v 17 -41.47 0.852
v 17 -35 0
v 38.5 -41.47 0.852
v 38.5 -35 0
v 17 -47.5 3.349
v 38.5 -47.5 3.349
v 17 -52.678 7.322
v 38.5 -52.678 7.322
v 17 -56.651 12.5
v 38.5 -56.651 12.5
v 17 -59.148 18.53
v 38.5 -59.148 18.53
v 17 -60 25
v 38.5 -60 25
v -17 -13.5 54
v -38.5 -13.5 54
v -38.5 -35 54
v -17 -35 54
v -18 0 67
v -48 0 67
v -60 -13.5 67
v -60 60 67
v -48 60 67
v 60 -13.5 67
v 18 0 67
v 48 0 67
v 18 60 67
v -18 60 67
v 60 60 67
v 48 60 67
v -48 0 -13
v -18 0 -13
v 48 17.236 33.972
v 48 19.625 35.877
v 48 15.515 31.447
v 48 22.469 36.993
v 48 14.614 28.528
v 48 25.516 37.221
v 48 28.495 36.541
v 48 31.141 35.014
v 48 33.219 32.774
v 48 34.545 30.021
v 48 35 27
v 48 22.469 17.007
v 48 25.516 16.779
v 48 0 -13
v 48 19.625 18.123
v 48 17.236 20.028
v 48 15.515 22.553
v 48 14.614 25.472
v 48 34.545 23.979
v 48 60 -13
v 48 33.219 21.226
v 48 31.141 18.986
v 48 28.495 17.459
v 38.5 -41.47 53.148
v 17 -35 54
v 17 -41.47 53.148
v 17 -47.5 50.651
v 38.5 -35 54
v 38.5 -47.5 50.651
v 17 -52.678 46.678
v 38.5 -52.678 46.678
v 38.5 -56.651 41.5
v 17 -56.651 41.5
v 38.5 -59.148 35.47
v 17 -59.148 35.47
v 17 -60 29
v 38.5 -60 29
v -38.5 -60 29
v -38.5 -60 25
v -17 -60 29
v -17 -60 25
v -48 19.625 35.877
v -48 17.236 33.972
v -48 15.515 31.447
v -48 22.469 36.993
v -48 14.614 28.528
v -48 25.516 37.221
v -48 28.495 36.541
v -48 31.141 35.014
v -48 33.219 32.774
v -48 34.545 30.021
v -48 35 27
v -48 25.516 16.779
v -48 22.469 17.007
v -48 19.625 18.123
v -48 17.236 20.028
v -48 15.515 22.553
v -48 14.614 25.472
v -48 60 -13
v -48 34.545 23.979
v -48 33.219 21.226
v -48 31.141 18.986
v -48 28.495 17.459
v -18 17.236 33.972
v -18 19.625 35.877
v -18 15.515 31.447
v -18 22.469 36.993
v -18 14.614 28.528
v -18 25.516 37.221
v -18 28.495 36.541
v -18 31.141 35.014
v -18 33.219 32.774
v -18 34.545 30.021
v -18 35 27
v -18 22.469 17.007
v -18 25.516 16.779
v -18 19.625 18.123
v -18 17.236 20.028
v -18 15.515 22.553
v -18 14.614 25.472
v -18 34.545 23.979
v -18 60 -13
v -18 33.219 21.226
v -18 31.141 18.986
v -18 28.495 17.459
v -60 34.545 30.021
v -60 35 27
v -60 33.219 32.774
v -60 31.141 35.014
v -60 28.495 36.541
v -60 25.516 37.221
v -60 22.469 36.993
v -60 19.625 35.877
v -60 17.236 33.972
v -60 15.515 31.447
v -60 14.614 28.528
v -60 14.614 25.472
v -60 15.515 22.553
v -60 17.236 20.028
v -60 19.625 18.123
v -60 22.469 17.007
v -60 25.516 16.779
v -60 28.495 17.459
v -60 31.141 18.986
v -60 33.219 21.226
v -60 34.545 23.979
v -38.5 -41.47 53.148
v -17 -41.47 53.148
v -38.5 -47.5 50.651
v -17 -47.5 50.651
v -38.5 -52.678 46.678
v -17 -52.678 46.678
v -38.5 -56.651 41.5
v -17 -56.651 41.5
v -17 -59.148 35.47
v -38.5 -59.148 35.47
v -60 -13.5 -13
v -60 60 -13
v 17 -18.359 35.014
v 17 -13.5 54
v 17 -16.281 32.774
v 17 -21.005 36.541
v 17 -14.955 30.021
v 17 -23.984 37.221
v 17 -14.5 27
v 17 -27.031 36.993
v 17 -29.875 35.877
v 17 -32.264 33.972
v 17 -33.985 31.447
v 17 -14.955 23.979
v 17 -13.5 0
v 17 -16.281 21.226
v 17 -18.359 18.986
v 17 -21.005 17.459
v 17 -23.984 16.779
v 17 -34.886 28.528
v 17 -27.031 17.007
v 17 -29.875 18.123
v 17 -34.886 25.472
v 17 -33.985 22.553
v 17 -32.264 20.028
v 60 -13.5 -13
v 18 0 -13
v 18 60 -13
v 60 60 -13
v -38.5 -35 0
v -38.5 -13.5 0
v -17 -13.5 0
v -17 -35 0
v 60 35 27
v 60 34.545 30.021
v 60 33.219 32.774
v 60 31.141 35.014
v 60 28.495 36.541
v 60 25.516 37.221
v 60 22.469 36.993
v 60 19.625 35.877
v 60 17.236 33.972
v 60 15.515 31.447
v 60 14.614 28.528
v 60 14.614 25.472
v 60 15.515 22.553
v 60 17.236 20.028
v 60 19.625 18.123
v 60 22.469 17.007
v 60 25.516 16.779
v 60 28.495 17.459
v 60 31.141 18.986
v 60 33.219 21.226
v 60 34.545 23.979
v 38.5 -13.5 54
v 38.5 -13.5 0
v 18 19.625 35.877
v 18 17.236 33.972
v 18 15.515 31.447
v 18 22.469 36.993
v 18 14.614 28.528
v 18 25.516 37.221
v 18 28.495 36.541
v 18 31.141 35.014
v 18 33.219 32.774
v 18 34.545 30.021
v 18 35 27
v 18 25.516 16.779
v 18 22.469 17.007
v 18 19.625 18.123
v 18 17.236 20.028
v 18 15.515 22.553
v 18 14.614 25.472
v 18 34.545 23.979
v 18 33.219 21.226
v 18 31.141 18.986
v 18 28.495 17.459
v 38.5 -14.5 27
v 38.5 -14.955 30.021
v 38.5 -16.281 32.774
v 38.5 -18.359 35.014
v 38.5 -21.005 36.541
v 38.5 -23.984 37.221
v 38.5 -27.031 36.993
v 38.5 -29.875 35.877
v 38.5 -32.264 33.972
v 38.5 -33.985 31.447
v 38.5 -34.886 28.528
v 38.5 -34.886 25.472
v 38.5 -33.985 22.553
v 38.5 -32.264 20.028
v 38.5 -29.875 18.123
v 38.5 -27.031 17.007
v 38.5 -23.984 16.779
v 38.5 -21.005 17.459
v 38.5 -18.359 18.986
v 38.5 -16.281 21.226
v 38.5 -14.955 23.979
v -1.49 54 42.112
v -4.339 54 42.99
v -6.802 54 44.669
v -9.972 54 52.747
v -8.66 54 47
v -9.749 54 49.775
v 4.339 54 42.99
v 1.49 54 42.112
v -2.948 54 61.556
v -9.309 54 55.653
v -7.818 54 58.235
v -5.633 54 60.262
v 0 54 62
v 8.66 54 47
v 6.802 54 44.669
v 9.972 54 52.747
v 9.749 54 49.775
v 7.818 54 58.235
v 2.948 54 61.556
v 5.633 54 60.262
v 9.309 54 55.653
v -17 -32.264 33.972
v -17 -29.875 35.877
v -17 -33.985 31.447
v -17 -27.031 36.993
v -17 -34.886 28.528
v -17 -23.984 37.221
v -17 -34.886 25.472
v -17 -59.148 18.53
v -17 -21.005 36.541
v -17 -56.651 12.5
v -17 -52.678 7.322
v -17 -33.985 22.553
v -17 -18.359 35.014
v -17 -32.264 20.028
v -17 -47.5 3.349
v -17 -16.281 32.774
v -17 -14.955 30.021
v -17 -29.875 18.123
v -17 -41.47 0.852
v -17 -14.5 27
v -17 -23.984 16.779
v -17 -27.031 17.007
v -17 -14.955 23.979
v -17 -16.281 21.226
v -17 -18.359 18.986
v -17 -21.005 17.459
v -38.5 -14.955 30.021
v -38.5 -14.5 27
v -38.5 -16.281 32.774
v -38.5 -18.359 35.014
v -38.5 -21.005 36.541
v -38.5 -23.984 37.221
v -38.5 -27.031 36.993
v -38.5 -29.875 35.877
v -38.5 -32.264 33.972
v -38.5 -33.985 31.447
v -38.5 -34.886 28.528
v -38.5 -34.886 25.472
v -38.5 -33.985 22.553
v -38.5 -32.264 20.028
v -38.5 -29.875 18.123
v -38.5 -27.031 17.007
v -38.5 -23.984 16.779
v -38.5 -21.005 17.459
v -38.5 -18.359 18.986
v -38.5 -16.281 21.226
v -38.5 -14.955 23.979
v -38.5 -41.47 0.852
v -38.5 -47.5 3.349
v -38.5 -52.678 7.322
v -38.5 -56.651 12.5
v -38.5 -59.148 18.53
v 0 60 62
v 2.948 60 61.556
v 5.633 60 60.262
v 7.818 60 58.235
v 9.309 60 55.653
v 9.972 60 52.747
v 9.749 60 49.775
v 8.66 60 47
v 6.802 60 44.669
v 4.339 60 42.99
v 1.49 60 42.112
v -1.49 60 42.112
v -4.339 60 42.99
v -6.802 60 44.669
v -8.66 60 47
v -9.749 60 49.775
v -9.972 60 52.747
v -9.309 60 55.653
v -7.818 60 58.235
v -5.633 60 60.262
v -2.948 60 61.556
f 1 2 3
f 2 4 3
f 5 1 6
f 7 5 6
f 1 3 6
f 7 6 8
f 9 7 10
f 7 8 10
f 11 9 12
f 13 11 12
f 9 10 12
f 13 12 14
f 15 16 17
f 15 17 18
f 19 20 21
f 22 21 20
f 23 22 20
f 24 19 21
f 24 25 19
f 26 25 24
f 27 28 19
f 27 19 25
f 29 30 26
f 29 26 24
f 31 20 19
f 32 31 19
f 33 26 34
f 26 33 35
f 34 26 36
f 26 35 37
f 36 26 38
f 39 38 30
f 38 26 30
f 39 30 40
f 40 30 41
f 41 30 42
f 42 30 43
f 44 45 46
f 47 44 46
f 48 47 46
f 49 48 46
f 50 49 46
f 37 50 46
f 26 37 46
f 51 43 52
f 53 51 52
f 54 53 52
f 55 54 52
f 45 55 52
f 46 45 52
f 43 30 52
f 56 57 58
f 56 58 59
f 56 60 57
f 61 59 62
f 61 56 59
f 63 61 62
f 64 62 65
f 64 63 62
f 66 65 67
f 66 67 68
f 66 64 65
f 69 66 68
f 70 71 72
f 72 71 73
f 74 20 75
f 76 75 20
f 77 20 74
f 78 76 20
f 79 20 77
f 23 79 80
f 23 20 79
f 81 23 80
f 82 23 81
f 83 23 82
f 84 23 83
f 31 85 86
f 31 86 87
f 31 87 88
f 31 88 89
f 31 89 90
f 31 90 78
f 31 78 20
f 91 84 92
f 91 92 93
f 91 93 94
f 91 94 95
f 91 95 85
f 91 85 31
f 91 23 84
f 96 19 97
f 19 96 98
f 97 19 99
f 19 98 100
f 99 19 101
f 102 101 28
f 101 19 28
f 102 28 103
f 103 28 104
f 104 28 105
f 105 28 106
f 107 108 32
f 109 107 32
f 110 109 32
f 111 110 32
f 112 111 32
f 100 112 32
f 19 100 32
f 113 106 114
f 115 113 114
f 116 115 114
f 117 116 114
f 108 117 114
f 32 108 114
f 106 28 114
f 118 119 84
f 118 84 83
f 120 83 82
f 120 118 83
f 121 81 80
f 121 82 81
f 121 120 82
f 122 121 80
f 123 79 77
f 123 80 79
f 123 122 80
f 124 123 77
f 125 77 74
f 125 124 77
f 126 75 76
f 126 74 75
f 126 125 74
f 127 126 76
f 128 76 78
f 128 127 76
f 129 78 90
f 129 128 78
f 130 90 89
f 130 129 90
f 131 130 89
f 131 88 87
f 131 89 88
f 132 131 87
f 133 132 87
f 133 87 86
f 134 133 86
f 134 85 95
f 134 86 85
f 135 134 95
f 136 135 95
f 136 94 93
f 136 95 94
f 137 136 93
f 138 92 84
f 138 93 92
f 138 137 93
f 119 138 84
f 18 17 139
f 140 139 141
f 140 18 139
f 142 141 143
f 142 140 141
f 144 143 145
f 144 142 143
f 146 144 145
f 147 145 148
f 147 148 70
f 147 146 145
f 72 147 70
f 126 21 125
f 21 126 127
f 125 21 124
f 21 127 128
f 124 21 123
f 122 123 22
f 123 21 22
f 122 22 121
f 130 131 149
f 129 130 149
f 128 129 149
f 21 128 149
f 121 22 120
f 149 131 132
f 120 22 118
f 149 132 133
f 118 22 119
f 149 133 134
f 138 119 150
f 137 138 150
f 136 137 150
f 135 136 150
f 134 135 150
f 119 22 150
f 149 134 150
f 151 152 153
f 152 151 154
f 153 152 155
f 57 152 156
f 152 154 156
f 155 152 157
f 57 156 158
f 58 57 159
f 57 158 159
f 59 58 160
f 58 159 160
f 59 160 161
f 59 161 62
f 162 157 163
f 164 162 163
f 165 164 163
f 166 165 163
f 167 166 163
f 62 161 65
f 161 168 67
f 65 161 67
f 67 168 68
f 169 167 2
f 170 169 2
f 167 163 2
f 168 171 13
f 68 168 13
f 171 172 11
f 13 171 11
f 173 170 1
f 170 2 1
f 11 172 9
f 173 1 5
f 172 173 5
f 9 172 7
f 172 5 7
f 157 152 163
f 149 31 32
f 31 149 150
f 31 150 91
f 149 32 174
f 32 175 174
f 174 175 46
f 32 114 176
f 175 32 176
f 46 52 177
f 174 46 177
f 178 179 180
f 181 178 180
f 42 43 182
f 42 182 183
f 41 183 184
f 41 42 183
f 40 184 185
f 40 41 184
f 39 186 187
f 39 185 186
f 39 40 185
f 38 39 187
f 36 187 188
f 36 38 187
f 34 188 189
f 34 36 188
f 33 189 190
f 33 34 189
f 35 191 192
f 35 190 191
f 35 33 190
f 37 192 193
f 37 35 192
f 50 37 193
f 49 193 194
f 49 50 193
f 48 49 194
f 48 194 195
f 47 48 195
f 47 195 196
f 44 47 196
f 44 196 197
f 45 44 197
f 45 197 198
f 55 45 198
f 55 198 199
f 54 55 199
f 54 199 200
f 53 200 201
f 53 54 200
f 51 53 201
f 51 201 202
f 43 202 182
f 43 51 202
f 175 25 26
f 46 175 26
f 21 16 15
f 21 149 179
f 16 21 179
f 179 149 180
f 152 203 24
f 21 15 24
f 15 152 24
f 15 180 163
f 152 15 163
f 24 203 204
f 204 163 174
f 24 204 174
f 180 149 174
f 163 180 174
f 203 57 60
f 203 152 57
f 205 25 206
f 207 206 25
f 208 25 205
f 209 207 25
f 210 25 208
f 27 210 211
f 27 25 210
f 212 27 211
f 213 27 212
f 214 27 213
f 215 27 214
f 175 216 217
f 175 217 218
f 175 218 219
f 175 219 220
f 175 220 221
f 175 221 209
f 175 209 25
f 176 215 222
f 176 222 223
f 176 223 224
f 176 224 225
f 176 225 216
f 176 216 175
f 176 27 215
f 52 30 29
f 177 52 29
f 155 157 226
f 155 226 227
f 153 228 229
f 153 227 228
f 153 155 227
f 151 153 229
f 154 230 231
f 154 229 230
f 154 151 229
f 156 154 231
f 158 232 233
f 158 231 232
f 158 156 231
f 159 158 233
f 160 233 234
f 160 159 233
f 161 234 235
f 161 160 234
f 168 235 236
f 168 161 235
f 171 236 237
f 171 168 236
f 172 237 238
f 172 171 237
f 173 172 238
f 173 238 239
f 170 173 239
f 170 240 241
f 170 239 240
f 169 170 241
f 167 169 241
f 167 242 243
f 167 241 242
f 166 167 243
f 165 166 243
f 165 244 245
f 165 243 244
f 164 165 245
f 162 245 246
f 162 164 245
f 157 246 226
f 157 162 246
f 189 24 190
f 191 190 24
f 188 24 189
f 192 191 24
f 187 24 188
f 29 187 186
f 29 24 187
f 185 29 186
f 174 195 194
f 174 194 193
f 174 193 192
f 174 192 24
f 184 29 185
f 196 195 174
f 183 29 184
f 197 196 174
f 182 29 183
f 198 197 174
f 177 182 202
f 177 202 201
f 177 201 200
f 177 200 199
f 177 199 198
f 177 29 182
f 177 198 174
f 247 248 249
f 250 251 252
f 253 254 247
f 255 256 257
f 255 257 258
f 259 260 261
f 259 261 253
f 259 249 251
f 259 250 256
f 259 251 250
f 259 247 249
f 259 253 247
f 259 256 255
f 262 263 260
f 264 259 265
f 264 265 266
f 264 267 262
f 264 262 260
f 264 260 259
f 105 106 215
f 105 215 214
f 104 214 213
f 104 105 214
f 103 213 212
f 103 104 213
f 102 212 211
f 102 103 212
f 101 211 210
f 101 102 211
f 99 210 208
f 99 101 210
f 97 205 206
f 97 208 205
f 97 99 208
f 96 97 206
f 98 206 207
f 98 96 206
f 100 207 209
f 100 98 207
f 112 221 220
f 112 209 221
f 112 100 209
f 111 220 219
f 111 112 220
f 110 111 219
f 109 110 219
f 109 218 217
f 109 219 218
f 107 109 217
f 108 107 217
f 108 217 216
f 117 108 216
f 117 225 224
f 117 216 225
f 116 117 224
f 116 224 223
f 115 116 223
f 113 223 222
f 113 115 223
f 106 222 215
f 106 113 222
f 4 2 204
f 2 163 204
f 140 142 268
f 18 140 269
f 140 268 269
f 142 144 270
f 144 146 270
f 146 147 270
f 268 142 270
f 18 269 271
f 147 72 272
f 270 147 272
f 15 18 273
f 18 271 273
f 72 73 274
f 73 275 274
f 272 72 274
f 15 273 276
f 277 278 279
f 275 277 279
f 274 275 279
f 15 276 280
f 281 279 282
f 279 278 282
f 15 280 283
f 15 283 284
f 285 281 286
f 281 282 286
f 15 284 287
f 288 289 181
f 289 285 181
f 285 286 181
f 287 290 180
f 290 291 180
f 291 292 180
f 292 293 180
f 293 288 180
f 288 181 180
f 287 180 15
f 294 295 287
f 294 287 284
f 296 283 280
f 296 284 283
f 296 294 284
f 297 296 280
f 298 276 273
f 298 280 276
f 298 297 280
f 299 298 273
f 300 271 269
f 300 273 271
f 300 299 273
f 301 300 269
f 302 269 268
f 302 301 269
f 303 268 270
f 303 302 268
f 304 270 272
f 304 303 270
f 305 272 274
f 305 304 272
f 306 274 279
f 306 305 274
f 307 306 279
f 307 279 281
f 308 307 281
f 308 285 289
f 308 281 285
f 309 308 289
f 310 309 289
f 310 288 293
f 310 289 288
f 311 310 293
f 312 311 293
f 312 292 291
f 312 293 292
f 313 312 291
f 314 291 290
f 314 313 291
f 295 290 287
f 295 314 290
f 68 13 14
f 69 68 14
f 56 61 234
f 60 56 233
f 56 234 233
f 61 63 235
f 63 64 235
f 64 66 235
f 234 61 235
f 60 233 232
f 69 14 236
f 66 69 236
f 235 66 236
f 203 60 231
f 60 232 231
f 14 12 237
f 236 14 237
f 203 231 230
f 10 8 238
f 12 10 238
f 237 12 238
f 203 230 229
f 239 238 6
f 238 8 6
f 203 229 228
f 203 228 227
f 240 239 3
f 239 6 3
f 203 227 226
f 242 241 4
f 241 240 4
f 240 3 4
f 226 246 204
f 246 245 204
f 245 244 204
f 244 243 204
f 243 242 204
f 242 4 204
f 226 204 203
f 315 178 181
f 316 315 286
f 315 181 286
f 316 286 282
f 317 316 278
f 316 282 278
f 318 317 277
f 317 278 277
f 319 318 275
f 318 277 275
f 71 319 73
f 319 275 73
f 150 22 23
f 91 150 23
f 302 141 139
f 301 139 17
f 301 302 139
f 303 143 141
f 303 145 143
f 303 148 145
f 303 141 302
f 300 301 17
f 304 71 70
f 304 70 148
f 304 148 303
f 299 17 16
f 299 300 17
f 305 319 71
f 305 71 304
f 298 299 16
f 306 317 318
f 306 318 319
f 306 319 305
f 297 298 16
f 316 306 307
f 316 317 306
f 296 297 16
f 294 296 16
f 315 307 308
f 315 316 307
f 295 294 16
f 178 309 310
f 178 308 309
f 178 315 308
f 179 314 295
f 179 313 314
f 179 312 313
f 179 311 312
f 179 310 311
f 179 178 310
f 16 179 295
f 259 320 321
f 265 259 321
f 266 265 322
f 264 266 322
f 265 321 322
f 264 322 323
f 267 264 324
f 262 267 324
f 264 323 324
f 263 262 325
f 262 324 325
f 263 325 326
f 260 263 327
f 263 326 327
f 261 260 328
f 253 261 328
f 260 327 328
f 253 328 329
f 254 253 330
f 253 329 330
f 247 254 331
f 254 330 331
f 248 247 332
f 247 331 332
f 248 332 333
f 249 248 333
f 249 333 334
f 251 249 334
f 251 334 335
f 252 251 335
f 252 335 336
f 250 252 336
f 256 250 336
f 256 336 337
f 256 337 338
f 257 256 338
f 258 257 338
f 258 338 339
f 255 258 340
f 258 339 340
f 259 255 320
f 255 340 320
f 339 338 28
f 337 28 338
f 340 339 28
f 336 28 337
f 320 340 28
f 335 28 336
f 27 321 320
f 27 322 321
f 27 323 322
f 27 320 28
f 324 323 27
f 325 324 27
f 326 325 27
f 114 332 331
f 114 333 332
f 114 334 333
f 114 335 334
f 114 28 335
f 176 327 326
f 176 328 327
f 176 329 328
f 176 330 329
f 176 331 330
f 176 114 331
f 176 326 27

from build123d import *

# Parameters (mm, degrees)
BOSS_EXTRUDE1_DEPTH     = 54
CUT_EXTRUDE1_DEPTH      = 145.623649518
CUT_EXTRUDE1_DEPTH_BACK = 145.623649518
SKETCH2_R               = 10.25
CUT_EXTRUDE2_DEPTH      = 145.623649518
CUT_EXTRUDE2_DEPTH_BACK = 145.623649518
SKETCH3_R               = 10.25
CUT_EXTRUDE3_DEPTH      = 101.578327685
CUT_EXTRUDE3_DEPTH_BACK = 101.578327685
SKETCH4_W               = 21.5
SKETCH4_H               = 46.5
FILLET1_R               = 25
SKETCH5_W               = 120
SKETCH5_H               = 13
BOSS_EXTRUDE2_DEPTH     = 73.5
SKETCH6_W               = 30
SKETCH6_H               = 80
CUT_EXTRUDE4_DEPTH      = 60
SKETCH7_R               = 10
CUT_EXTRUDE5_DEPTH      = 6


with BuildPart() as part:
    # Sketch1 → Boss-Extrude1 (new body)
    with BuildSketch(Plane.XY):
        Polygon((60, 60), (-60, 60), (-60, -60), (-17, -60), (-17, -13.5), (17, -13.5), (17, -60), (60, -60), align=None)
    extrude(amount=BOSS_EXTRUDE1_DEPTH)

    # Sketch2 → Cut-Extrude1 (cut, two sides: drawn at the far end of the back side and taken through both)
    with BuildSketch(Plane(origin=(60, 0, 0), x_dir=(0, 0, -1), z_dir=(1, 0, 0)).offset(-CUT_EXTRUDE1_DEPTH_BACK)):
        with Locations(Location((-27, -24.75, 0), (0, 0, 90))):
            Circle(SKETCH2_R)
    extrude(amount=CUT_EXTRUDE1_DEPTH + CUT_EXTRUDE1_DEPTH_BACK, mode=Mode.SUBTRACT)

    # Sketch3 → Cut-Extrude2 (cut, two sides: drawn at the far end of the back side and taken through both)
    with BuildSketch(Plane(origin=(60, 0, 0), x_dir=(0, 0, -1), z_dir=(1, 0, 0)).offset(-CUT_EXTRUDE2_DEPTH_BACK)):
        with Locations(Location((-27, 24.75, 0), (0, 0, 90))):
            Circle(SKETCH3_R)
    extrude(amount=CUT_EXTRUDE2_DEPTH + CUT_EXTRUDE2_DEPTH_BACK, mode=Mode.SUBTRACT)

    # Sketch4 → Cut-Extrude3 (cut, two sides: drawn at the far end of the back side and taken through both)
    with BuildSketch(Plane.XY.offset(54).offset(-CUT_EXTRUDE3_DEPTH_BACK)):
        with Locations((-49.25, -36.75)):
            Rectangle(SKETCH4_W, SKETCH4_H)
        with Locations((49.25, -36.75)):
            Rectangle(SKETCH4_W, SKETCH4_H)
    extrude(amount=CUT_EXTRUDE3_DEPTH + CUT_EXTRUDE3_DEPTH_BACK, mode=Mode.SUBTRACT)

    # Fillet1
    fillet1_edges = [part.edges().sort_by_distance(p)[0] for p in [
        (27.75, -60, 0),
        (27.75, -60, 54),
        (-27.75, -60, 0),
        (-27.75, -60, 54),
    ]]
    fillet(fillet1_edges, radius=FILLET1_R)

    # Sketch5 → Boss-Extrude2 (add)
    with BuildSketch(Plane(origin=(0, 60, 0), x_dir=(1, 0, 0), z_dir=(0, 1, 0))):
        with Locations((0, 6.5)):
            Rectangle(SKETCH5_W, SKETCH5_H)
        with Locations((0, -60.5)):
            Rectangle(SKETCH5_W, SKETCH5_H)
    extrude(amount=-BOSS_EXTRUDE2_DEPTH)

    # Sketch6 → Cut-Extrude4 (cut)
    with BuildSketch(Plane(origin=(0, 60, 0), x_dir=(1, 0, 0), z_dir=(0, 1, 0))):
        with Locations((-33, -27)):
            Rectangle(SKETCH6_W, SKETCH6_H)
        with Locations((33, -27)):
            Rectangle(SKETCH6_W, SKETCH6_H)
    extrude(amount=-CUT_EXTRUDE4_DEPTH, mode=Mode.SUBTRACT)

    # Sketch7 → Cut-Extrude5 (cut)
    with BuildSketch(Plane(origin=(0, 60, 0), x_dir=(1, 0, 0), z_dir=(0, 1, 0))):
        with Locations(Location((0, -52, 0), (0, 0, 270))):
            Circle(SKETCH7_R)
    extrude(amount=-CUT_EXTRUDE5_DEPTH, mode=Mode.SUBTRACT)


solid = part.part
